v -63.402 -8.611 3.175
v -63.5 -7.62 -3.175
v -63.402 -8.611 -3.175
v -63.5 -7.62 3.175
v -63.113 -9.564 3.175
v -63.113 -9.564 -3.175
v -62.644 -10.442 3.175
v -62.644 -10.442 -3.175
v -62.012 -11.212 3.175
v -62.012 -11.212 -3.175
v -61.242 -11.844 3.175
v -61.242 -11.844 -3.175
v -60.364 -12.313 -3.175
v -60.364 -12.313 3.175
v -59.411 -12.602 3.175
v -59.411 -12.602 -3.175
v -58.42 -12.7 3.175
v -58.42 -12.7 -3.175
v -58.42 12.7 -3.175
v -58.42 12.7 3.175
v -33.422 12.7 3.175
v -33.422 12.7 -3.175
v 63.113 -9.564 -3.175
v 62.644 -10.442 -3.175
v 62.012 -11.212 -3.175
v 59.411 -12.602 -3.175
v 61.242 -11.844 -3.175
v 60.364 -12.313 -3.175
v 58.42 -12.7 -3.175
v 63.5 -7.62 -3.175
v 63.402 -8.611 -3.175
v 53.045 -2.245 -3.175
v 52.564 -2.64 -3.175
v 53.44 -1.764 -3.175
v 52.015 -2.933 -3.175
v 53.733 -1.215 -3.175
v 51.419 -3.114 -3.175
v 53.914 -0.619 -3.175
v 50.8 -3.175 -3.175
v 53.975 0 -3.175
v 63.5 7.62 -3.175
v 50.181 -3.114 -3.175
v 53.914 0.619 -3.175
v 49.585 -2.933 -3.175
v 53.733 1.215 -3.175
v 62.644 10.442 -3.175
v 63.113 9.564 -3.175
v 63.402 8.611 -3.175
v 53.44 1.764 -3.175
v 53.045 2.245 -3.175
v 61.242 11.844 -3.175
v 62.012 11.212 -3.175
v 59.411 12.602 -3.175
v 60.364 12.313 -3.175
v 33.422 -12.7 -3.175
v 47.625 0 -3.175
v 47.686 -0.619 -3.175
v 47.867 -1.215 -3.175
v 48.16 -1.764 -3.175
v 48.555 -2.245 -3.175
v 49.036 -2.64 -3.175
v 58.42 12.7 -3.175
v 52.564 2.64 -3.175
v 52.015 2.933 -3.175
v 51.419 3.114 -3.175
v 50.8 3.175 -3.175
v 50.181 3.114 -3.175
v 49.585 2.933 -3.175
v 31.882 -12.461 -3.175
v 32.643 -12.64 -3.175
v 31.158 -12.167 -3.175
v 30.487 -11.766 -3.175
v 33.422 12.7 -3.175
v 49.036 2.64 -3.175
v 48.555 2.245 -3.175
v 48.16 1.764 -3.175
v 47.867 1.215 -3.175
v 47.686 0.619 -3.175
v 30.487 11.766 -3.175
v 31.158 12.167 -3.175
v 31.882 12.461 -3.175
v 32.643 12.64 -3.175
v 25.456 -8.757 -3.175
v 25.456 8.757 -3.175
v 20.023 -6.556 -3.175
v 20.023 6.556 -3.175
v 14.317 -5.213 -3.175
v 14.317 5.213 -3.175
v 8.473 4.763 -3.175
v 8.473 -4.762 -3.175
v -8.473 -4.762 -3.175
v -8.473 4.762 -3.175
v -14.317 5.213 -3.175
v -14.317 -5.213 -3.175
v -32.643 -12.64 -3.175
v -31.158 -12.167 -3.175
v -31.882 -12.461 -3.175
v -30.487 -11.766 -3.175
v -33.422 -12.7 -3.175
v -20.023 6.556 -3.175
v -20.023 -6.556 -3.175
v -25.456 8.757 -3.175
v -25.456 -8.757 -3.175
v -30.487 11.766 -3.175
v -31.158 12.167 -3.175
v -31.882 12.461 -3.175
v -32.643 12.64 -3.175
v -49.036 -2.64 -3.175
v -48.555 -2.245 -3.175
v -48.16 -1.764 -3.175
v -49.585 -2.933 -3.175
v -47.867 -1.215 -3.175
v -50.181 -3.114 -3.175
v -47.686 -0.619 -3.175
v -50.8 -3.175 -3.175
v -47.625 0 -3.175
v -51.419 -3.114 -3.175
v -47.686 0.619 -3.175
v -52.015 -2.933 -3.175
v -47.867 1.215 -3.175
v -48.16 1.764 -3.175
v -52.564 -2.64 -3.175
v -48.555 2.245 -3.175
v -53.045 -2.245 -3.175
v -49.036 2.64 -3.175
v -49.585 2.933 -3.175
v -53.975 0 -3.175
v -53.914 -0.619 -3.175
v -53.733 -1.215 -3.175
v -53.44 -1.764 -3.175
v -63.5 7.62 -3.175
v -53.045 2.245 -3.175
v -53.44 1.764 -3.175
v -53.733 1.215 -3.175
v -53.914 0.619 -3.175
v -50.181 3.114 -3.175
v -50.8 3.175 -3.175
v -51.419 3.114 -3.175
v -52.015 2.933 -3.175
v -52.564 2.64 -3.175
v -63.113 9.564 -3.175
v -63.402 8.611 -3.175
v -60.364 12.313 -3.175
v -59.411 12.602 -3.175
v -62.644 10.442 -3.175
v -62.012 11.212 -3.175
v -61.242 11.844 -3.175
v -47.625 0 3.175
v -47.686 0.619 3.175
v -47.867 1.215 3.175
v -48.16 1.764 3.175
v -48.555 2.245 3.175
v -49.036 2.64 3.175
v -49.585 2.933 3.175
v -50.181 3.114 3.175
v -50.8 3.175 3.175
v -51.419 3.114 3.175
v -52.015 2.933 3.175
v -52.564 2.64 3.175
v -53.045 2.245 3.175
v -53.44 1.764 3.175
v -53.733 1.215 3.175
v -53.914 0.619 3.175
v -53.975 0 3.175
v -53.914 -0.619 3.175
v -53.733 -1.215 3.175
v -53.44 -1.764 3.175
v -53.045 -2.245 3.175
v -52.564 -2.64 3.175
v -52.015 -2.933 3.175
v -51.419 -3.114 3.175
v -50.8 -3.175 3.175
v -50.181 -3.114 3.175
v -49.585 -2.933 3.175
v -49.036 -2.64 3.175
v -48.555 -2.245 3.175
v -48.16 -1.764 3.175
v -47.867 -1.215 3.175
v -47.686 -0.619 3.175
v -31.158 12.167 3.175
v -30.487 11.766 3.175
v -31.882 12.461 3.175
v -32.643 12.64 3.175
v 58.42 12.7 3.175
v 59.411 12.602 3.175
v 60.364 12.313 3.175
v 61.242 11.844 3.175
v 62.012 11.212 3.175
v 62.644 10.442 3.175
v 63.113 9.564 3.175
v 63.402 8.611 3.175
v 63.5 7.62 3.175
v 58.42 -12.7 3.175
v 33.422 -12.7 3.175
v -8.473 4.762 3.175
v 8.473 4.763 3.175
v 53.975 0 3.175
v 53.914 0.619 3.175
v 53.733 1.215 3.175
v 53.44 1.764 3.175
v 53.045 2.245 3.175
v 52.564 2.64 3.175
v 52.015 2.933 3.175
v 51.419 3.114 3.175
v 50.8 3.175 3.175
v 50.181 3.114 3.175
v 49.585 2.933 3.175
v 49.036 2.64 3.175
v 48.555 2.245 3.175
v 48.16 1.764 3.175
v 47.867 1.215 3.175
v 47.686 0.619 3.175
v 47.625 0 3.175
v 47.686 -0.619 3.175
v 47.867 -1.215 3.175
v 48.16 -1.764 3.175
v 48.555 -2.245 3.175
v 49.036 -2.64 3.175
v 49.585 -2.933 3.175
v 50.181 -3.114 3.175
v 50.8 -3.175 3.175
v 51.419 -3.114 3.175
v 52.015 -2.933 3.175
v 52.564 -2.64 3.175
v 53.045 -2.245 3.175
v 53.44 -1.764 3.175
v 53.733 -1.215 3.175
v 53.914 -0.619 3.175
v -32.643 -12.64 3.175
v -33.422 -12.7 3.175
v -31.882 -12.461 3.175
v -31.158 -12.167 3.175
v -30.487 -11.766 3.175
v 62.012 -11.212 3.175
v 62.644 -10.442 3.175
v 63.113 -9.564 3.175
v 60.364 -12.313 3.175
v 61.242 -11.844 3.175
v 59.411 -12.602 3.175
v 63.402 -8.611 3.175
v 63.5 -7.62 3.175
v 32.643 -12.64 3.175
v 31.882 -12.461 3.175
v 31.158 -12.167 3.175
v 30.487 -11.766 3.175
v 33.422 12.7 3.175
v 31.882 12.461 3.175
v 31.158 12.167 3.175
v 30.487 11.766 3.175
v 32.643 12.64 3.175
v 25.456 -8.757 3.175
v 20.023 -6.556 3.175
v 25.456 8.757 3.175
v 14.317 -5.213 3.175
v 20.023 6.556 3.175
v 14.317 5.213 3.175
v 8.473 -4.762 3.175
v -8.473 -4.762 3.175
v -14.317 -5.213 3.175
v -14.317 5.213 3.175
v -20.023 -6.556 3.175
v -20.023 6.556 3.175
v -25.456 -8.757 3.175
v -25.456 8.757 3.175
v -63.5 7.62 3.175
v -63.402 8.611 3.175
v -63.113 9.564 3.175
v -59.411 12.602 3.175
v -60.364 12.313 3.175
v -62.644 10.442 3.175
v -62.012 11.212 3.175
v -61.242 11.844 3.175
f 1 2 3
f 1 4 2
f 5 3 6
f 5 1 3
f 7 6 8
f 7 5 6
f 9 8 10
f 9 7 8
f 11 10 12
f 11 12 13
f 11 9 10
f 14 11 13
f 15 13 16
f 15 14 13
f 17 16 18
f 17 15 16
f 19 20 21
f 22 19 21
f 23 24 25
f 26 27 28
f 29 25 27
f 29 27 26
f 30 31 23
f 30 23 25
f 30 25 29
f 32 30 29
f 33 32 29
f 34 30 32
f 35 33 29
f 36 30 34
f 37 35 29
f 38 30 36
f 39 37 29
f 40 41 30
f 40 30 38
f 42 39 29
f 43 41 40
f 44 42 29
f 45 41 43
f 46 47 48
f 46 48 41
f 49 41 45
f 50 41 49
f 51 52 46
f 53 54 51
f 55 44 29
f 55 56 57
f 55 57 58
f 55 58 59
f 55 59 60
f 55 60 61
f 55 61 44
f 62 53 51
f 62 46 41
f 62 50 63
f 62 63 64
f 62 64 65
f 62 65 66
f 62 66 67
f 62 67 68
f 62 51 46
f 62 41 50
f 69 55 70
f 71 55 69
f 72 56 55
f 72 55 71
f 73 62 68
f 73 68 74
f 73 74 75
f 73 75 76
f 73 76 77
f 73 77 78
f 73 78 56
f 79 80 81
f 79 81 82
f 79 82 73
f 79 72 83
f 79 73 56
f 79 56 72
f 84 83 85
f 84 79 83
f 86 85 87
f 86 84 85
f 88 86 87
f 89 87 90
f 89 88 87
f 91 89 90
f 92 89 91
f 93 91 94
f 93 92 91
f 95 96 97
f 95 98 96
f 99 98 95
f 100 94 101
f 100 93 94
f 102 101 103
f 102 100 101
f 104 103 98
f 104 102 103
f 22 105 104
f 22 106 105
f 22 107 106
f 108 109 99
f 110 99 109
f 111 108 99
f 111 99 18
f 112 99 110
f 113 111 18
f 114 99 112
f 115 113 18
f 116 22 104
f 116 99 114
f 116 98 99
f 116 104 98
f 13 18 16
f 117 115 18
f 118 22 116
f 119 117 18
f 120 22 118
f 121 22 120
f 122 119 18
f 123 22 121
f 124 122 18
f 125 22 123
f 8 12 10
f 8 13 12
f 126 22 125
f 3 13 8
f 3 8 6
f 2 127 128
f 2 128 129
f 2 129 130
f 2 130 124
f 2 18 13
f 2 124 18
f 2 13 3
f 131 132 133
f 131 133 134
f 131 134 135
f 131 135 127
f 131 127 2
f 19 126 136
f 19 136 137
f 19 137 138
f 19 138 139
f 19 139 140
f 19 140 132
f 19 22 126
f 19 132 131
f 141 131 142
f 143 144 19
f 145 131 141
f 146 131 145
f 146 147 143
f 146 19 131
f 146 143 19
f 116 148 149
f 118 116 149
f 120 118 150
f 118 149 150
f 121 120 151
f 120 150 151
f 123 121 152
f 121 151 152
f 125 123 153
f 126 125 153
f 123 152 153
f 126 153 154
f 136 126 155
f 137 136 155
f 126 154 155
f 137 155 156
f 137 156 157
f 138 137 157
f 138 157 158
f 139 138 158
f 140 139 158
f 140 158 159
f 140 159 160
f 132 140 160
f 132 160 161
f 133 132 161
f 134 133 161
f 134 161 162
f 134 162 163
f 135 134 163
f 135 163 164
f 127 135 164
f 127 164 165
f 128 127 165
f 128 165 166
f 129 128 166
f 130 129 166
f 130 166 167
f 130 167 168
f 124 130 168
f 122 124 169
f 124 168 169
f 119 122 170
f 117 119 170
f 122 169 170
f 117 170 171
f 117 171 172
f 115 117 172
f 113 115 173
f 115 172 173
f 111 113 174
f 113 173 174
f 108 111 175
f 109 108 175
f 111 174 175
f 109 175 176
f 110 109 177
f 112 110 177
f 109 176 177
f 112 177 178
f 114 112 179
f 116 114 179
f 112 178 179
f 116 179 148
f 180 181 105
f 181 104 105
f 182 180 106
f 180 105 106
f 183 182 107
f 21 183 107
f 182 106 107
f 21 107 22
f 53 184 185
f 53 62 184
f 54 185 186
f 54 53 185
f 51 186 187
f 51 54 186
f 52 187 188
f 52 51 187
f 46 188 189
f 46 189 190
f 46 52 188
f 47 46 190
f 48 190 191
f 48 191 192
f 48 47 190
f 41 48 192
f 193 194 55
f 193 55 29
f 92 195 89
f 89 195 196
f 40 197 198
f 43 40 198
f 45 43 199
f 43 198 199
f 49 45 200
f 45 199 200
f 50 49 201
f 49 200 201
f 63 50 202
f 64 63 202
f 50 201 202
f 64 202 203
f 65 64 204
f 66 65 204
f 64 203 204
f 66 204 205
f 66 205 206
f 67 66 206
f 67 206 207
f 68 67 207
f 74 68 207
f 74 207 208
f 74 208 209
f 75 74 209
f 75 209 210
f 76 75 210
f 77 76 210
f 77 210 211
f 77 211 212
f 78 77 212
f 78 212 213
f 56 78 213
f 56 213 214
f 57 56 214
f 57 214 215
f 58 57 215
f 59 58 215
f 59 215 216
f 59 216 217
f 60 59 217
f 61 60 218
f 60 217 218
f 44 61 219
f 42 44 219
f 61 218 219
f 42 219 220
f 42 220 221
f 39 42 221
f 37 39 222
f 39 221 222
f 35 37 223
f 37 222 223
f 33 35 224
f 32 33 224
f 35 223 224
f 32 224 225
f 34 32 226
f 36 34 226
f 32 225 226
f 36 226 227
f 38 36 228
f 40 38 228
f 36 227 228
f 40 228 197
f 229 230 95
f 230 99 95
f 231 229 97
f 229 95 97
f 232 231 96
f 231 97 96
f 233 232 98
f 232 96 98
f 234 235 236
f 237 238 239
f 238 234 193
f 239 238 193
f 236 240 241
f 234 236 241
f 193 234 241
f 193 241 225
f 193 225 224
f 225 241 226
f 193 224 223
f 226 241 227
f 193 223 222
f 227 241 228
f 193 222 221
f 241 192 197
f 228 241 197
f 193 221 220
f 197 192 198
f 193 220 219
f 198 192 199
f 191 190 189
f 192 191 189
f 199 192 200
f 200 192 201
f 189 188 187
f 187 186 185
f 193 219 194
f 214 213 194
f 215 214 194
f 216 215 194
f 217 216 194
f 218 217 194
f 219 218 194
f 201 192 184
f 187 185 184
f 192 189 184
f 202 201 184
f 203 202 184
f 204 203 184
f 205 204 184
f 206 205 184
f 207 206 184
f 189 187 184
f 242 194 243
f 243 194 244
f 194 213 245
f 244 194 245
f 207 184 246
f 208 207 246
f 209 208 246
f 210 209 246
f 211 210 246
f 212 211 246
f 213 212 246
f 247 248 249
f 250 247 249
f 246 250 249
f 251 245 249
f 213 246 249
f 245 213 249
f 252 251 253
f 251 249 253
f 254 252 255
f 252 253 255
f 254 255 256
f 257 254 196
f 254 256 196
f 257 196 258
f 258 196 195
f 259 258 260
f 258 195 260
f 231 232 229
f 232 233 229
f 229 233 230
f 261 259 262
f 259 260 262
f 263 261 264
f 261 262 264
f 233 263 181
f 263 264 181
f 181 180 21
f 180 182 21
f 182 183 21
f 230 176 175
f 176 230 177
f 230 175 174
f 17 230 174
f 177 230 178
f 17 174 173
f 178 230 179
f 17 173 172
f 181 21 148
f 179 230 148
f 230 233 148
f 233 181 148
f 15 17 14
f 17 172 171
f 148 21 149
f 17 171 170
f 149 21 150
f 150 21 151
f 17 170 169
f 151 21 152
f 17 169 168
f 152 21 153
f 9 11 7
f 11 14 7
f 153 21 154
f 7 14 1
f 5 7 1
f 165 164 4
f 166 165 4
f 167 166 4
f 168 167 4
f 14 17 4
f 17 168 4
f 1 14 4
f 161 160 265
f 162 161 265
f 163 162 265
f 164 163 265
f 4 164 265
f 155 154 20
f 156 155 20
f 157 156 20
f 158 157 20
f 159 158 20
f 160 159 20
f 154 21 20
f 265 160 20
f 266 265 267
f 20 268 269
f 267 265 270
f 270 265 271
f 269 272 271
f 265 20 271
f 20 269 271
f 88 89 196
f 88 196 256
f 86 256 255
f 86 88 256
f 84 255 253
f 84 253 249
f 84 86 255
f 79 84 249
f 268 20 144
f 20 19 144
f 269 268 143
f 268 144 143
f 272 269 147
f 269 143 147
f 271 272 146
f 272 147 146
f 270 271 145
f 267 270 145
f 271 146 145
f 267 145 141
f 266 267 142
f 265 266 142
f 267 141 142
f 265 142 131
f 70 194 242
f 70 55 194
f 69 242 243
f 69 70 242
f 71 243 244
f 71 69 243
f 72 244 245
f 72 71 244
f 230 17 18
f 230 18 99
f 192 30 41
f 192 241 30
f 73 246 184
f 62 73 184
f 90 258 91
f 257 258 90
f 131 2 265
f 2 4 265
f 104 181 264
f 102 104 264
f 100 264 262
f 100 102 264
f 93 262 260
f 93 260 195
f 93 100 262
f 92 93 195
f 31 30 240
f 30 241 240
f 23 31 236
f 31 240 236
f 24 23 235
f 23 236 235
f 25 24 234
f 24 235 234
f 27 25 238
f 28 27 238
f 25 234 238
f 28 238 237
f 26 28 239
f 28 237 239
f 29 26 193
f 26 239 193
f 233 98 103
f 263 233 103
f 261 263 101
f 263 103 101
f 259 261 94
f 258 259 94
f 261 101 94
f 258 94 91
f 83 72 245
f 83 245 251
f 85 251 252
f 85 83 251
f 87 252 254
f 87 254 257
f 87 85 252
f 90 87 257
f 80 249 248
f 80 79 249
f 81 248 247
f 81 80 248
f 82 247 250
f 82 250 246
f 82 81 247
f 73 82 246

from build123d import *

# Parameters (mm, degrees)
F0_W        = 127
F0_H        = 25.4
F1_DEPTH    = 3.175
F2_W        = 63.5
F2_H        = 7.9375
F3_DEPTH    = 25.4
F4_T1_DEPTH = 6.35
F5_R        = 5.08
F6_R        = 3.175
F7_DEPTH    = 25.4


# Not quite as in the source:
# - a fillet or chamfer that OpenCascade refuses, or shapes differently, is made with other operations: its cross-section is extruded or revolved along the edge and cut away or added


with BuildPart() as f1:
    # F0 (on Top) → F1 (new body, symmetric)
    with BuildSketch(Plane.XY):
        Rectangle(F0_W, F0_H)
    extrude(amount=F1_DEPTH, both=True)

    # F2 (on face) → F3 (cut)
    with BuildSketch(Plane.XY.offset(3.175)):
        with Locations((0, 8.73125)):
            Rectangle(F2_W, F2_H)
        with Locations((0, -8.73125)):
            Rectangle(F2_W, F2_H)
    extrude(amount=-F3_DEPTH, mode=Mode.SUBTRACT)

    # F4: fillet of radius 38.1 on 4 edges, made by hand

    # F4_s2 → F4_t1 (join)
    with BuildSketch(Plane.XY.offset(-3.175)):
        with BuildLine():
            ThreePointArc((-31.75, 12.7), (-20.7694028252, 6.8014320042), (-8.4726807009, 4.7625))
            Line((-8.4726807009, 4.7625), (-31.75, 4.7625))
            Line((-31.75, 4.7625), (-31.75, 12.7))
        make_face()
        with BuildLine():
            ThreePointArc((8.4726807009, 4.7625), (20.7694028252, 6.8014320042), (31.75, 12.7))
            Line((31.75, 12.7), (31.75, 4.7625))
            Line((31.75, 4.7625), (8.4726807009, 4.7625))
        make_face()
        with BuildLine():
            ThreePointArc((31.75, -12.7), (20.7694028252, -6.8014320042), (8.4726807009, -4.7625))
            Line((8.4726807009, -4.7625), (31.75, -4.7625))
            Line((31.75, -4.7625), (31.75, -12.7))
        make_face()
        with BuildLine():
            ThreePointArc((-31.75, -12.7), (-20.7694028252, -6.8014320042), (-8.4726807009, -4.7625))
            Line((-8.4726807009, -4.7625), (-31.75, -4.7625))
            Line((-31.75, -4.7625), (-31.75, -12.7))
        make_face()
    extrude(amount=F4_T1_DEPTH)

    # F5
    f5_edges = [f1.edges().sort_by_distance(p)[0] for p in [
        (-63.5, 12.7, 0),
        (-31.75, 12.7, 0),
        (-63.5, -12.7, 0),
        (-31.75, -12.7, 0),
        (31.75, -12.7, 0),
        (63.5, -12.7, 0),
        (63.5, 12.7, 0),
        (31.75, 12.7, 0),
    ]]
    fillet(f5_edges, radius=F5_R)

    # F6 (on face) → F7 (cut)
    with BuildSketch(Plane.XY.offset(3.175)):
        with Locations((-50.8, 0)):
            Circle(F6_R)
        with Locations((50.8, 0)):
            Circle(F6_R)
    extrude(amount=-F7_DEPTH, mode=Mode.SUBTRACT)


solid = f1.part
